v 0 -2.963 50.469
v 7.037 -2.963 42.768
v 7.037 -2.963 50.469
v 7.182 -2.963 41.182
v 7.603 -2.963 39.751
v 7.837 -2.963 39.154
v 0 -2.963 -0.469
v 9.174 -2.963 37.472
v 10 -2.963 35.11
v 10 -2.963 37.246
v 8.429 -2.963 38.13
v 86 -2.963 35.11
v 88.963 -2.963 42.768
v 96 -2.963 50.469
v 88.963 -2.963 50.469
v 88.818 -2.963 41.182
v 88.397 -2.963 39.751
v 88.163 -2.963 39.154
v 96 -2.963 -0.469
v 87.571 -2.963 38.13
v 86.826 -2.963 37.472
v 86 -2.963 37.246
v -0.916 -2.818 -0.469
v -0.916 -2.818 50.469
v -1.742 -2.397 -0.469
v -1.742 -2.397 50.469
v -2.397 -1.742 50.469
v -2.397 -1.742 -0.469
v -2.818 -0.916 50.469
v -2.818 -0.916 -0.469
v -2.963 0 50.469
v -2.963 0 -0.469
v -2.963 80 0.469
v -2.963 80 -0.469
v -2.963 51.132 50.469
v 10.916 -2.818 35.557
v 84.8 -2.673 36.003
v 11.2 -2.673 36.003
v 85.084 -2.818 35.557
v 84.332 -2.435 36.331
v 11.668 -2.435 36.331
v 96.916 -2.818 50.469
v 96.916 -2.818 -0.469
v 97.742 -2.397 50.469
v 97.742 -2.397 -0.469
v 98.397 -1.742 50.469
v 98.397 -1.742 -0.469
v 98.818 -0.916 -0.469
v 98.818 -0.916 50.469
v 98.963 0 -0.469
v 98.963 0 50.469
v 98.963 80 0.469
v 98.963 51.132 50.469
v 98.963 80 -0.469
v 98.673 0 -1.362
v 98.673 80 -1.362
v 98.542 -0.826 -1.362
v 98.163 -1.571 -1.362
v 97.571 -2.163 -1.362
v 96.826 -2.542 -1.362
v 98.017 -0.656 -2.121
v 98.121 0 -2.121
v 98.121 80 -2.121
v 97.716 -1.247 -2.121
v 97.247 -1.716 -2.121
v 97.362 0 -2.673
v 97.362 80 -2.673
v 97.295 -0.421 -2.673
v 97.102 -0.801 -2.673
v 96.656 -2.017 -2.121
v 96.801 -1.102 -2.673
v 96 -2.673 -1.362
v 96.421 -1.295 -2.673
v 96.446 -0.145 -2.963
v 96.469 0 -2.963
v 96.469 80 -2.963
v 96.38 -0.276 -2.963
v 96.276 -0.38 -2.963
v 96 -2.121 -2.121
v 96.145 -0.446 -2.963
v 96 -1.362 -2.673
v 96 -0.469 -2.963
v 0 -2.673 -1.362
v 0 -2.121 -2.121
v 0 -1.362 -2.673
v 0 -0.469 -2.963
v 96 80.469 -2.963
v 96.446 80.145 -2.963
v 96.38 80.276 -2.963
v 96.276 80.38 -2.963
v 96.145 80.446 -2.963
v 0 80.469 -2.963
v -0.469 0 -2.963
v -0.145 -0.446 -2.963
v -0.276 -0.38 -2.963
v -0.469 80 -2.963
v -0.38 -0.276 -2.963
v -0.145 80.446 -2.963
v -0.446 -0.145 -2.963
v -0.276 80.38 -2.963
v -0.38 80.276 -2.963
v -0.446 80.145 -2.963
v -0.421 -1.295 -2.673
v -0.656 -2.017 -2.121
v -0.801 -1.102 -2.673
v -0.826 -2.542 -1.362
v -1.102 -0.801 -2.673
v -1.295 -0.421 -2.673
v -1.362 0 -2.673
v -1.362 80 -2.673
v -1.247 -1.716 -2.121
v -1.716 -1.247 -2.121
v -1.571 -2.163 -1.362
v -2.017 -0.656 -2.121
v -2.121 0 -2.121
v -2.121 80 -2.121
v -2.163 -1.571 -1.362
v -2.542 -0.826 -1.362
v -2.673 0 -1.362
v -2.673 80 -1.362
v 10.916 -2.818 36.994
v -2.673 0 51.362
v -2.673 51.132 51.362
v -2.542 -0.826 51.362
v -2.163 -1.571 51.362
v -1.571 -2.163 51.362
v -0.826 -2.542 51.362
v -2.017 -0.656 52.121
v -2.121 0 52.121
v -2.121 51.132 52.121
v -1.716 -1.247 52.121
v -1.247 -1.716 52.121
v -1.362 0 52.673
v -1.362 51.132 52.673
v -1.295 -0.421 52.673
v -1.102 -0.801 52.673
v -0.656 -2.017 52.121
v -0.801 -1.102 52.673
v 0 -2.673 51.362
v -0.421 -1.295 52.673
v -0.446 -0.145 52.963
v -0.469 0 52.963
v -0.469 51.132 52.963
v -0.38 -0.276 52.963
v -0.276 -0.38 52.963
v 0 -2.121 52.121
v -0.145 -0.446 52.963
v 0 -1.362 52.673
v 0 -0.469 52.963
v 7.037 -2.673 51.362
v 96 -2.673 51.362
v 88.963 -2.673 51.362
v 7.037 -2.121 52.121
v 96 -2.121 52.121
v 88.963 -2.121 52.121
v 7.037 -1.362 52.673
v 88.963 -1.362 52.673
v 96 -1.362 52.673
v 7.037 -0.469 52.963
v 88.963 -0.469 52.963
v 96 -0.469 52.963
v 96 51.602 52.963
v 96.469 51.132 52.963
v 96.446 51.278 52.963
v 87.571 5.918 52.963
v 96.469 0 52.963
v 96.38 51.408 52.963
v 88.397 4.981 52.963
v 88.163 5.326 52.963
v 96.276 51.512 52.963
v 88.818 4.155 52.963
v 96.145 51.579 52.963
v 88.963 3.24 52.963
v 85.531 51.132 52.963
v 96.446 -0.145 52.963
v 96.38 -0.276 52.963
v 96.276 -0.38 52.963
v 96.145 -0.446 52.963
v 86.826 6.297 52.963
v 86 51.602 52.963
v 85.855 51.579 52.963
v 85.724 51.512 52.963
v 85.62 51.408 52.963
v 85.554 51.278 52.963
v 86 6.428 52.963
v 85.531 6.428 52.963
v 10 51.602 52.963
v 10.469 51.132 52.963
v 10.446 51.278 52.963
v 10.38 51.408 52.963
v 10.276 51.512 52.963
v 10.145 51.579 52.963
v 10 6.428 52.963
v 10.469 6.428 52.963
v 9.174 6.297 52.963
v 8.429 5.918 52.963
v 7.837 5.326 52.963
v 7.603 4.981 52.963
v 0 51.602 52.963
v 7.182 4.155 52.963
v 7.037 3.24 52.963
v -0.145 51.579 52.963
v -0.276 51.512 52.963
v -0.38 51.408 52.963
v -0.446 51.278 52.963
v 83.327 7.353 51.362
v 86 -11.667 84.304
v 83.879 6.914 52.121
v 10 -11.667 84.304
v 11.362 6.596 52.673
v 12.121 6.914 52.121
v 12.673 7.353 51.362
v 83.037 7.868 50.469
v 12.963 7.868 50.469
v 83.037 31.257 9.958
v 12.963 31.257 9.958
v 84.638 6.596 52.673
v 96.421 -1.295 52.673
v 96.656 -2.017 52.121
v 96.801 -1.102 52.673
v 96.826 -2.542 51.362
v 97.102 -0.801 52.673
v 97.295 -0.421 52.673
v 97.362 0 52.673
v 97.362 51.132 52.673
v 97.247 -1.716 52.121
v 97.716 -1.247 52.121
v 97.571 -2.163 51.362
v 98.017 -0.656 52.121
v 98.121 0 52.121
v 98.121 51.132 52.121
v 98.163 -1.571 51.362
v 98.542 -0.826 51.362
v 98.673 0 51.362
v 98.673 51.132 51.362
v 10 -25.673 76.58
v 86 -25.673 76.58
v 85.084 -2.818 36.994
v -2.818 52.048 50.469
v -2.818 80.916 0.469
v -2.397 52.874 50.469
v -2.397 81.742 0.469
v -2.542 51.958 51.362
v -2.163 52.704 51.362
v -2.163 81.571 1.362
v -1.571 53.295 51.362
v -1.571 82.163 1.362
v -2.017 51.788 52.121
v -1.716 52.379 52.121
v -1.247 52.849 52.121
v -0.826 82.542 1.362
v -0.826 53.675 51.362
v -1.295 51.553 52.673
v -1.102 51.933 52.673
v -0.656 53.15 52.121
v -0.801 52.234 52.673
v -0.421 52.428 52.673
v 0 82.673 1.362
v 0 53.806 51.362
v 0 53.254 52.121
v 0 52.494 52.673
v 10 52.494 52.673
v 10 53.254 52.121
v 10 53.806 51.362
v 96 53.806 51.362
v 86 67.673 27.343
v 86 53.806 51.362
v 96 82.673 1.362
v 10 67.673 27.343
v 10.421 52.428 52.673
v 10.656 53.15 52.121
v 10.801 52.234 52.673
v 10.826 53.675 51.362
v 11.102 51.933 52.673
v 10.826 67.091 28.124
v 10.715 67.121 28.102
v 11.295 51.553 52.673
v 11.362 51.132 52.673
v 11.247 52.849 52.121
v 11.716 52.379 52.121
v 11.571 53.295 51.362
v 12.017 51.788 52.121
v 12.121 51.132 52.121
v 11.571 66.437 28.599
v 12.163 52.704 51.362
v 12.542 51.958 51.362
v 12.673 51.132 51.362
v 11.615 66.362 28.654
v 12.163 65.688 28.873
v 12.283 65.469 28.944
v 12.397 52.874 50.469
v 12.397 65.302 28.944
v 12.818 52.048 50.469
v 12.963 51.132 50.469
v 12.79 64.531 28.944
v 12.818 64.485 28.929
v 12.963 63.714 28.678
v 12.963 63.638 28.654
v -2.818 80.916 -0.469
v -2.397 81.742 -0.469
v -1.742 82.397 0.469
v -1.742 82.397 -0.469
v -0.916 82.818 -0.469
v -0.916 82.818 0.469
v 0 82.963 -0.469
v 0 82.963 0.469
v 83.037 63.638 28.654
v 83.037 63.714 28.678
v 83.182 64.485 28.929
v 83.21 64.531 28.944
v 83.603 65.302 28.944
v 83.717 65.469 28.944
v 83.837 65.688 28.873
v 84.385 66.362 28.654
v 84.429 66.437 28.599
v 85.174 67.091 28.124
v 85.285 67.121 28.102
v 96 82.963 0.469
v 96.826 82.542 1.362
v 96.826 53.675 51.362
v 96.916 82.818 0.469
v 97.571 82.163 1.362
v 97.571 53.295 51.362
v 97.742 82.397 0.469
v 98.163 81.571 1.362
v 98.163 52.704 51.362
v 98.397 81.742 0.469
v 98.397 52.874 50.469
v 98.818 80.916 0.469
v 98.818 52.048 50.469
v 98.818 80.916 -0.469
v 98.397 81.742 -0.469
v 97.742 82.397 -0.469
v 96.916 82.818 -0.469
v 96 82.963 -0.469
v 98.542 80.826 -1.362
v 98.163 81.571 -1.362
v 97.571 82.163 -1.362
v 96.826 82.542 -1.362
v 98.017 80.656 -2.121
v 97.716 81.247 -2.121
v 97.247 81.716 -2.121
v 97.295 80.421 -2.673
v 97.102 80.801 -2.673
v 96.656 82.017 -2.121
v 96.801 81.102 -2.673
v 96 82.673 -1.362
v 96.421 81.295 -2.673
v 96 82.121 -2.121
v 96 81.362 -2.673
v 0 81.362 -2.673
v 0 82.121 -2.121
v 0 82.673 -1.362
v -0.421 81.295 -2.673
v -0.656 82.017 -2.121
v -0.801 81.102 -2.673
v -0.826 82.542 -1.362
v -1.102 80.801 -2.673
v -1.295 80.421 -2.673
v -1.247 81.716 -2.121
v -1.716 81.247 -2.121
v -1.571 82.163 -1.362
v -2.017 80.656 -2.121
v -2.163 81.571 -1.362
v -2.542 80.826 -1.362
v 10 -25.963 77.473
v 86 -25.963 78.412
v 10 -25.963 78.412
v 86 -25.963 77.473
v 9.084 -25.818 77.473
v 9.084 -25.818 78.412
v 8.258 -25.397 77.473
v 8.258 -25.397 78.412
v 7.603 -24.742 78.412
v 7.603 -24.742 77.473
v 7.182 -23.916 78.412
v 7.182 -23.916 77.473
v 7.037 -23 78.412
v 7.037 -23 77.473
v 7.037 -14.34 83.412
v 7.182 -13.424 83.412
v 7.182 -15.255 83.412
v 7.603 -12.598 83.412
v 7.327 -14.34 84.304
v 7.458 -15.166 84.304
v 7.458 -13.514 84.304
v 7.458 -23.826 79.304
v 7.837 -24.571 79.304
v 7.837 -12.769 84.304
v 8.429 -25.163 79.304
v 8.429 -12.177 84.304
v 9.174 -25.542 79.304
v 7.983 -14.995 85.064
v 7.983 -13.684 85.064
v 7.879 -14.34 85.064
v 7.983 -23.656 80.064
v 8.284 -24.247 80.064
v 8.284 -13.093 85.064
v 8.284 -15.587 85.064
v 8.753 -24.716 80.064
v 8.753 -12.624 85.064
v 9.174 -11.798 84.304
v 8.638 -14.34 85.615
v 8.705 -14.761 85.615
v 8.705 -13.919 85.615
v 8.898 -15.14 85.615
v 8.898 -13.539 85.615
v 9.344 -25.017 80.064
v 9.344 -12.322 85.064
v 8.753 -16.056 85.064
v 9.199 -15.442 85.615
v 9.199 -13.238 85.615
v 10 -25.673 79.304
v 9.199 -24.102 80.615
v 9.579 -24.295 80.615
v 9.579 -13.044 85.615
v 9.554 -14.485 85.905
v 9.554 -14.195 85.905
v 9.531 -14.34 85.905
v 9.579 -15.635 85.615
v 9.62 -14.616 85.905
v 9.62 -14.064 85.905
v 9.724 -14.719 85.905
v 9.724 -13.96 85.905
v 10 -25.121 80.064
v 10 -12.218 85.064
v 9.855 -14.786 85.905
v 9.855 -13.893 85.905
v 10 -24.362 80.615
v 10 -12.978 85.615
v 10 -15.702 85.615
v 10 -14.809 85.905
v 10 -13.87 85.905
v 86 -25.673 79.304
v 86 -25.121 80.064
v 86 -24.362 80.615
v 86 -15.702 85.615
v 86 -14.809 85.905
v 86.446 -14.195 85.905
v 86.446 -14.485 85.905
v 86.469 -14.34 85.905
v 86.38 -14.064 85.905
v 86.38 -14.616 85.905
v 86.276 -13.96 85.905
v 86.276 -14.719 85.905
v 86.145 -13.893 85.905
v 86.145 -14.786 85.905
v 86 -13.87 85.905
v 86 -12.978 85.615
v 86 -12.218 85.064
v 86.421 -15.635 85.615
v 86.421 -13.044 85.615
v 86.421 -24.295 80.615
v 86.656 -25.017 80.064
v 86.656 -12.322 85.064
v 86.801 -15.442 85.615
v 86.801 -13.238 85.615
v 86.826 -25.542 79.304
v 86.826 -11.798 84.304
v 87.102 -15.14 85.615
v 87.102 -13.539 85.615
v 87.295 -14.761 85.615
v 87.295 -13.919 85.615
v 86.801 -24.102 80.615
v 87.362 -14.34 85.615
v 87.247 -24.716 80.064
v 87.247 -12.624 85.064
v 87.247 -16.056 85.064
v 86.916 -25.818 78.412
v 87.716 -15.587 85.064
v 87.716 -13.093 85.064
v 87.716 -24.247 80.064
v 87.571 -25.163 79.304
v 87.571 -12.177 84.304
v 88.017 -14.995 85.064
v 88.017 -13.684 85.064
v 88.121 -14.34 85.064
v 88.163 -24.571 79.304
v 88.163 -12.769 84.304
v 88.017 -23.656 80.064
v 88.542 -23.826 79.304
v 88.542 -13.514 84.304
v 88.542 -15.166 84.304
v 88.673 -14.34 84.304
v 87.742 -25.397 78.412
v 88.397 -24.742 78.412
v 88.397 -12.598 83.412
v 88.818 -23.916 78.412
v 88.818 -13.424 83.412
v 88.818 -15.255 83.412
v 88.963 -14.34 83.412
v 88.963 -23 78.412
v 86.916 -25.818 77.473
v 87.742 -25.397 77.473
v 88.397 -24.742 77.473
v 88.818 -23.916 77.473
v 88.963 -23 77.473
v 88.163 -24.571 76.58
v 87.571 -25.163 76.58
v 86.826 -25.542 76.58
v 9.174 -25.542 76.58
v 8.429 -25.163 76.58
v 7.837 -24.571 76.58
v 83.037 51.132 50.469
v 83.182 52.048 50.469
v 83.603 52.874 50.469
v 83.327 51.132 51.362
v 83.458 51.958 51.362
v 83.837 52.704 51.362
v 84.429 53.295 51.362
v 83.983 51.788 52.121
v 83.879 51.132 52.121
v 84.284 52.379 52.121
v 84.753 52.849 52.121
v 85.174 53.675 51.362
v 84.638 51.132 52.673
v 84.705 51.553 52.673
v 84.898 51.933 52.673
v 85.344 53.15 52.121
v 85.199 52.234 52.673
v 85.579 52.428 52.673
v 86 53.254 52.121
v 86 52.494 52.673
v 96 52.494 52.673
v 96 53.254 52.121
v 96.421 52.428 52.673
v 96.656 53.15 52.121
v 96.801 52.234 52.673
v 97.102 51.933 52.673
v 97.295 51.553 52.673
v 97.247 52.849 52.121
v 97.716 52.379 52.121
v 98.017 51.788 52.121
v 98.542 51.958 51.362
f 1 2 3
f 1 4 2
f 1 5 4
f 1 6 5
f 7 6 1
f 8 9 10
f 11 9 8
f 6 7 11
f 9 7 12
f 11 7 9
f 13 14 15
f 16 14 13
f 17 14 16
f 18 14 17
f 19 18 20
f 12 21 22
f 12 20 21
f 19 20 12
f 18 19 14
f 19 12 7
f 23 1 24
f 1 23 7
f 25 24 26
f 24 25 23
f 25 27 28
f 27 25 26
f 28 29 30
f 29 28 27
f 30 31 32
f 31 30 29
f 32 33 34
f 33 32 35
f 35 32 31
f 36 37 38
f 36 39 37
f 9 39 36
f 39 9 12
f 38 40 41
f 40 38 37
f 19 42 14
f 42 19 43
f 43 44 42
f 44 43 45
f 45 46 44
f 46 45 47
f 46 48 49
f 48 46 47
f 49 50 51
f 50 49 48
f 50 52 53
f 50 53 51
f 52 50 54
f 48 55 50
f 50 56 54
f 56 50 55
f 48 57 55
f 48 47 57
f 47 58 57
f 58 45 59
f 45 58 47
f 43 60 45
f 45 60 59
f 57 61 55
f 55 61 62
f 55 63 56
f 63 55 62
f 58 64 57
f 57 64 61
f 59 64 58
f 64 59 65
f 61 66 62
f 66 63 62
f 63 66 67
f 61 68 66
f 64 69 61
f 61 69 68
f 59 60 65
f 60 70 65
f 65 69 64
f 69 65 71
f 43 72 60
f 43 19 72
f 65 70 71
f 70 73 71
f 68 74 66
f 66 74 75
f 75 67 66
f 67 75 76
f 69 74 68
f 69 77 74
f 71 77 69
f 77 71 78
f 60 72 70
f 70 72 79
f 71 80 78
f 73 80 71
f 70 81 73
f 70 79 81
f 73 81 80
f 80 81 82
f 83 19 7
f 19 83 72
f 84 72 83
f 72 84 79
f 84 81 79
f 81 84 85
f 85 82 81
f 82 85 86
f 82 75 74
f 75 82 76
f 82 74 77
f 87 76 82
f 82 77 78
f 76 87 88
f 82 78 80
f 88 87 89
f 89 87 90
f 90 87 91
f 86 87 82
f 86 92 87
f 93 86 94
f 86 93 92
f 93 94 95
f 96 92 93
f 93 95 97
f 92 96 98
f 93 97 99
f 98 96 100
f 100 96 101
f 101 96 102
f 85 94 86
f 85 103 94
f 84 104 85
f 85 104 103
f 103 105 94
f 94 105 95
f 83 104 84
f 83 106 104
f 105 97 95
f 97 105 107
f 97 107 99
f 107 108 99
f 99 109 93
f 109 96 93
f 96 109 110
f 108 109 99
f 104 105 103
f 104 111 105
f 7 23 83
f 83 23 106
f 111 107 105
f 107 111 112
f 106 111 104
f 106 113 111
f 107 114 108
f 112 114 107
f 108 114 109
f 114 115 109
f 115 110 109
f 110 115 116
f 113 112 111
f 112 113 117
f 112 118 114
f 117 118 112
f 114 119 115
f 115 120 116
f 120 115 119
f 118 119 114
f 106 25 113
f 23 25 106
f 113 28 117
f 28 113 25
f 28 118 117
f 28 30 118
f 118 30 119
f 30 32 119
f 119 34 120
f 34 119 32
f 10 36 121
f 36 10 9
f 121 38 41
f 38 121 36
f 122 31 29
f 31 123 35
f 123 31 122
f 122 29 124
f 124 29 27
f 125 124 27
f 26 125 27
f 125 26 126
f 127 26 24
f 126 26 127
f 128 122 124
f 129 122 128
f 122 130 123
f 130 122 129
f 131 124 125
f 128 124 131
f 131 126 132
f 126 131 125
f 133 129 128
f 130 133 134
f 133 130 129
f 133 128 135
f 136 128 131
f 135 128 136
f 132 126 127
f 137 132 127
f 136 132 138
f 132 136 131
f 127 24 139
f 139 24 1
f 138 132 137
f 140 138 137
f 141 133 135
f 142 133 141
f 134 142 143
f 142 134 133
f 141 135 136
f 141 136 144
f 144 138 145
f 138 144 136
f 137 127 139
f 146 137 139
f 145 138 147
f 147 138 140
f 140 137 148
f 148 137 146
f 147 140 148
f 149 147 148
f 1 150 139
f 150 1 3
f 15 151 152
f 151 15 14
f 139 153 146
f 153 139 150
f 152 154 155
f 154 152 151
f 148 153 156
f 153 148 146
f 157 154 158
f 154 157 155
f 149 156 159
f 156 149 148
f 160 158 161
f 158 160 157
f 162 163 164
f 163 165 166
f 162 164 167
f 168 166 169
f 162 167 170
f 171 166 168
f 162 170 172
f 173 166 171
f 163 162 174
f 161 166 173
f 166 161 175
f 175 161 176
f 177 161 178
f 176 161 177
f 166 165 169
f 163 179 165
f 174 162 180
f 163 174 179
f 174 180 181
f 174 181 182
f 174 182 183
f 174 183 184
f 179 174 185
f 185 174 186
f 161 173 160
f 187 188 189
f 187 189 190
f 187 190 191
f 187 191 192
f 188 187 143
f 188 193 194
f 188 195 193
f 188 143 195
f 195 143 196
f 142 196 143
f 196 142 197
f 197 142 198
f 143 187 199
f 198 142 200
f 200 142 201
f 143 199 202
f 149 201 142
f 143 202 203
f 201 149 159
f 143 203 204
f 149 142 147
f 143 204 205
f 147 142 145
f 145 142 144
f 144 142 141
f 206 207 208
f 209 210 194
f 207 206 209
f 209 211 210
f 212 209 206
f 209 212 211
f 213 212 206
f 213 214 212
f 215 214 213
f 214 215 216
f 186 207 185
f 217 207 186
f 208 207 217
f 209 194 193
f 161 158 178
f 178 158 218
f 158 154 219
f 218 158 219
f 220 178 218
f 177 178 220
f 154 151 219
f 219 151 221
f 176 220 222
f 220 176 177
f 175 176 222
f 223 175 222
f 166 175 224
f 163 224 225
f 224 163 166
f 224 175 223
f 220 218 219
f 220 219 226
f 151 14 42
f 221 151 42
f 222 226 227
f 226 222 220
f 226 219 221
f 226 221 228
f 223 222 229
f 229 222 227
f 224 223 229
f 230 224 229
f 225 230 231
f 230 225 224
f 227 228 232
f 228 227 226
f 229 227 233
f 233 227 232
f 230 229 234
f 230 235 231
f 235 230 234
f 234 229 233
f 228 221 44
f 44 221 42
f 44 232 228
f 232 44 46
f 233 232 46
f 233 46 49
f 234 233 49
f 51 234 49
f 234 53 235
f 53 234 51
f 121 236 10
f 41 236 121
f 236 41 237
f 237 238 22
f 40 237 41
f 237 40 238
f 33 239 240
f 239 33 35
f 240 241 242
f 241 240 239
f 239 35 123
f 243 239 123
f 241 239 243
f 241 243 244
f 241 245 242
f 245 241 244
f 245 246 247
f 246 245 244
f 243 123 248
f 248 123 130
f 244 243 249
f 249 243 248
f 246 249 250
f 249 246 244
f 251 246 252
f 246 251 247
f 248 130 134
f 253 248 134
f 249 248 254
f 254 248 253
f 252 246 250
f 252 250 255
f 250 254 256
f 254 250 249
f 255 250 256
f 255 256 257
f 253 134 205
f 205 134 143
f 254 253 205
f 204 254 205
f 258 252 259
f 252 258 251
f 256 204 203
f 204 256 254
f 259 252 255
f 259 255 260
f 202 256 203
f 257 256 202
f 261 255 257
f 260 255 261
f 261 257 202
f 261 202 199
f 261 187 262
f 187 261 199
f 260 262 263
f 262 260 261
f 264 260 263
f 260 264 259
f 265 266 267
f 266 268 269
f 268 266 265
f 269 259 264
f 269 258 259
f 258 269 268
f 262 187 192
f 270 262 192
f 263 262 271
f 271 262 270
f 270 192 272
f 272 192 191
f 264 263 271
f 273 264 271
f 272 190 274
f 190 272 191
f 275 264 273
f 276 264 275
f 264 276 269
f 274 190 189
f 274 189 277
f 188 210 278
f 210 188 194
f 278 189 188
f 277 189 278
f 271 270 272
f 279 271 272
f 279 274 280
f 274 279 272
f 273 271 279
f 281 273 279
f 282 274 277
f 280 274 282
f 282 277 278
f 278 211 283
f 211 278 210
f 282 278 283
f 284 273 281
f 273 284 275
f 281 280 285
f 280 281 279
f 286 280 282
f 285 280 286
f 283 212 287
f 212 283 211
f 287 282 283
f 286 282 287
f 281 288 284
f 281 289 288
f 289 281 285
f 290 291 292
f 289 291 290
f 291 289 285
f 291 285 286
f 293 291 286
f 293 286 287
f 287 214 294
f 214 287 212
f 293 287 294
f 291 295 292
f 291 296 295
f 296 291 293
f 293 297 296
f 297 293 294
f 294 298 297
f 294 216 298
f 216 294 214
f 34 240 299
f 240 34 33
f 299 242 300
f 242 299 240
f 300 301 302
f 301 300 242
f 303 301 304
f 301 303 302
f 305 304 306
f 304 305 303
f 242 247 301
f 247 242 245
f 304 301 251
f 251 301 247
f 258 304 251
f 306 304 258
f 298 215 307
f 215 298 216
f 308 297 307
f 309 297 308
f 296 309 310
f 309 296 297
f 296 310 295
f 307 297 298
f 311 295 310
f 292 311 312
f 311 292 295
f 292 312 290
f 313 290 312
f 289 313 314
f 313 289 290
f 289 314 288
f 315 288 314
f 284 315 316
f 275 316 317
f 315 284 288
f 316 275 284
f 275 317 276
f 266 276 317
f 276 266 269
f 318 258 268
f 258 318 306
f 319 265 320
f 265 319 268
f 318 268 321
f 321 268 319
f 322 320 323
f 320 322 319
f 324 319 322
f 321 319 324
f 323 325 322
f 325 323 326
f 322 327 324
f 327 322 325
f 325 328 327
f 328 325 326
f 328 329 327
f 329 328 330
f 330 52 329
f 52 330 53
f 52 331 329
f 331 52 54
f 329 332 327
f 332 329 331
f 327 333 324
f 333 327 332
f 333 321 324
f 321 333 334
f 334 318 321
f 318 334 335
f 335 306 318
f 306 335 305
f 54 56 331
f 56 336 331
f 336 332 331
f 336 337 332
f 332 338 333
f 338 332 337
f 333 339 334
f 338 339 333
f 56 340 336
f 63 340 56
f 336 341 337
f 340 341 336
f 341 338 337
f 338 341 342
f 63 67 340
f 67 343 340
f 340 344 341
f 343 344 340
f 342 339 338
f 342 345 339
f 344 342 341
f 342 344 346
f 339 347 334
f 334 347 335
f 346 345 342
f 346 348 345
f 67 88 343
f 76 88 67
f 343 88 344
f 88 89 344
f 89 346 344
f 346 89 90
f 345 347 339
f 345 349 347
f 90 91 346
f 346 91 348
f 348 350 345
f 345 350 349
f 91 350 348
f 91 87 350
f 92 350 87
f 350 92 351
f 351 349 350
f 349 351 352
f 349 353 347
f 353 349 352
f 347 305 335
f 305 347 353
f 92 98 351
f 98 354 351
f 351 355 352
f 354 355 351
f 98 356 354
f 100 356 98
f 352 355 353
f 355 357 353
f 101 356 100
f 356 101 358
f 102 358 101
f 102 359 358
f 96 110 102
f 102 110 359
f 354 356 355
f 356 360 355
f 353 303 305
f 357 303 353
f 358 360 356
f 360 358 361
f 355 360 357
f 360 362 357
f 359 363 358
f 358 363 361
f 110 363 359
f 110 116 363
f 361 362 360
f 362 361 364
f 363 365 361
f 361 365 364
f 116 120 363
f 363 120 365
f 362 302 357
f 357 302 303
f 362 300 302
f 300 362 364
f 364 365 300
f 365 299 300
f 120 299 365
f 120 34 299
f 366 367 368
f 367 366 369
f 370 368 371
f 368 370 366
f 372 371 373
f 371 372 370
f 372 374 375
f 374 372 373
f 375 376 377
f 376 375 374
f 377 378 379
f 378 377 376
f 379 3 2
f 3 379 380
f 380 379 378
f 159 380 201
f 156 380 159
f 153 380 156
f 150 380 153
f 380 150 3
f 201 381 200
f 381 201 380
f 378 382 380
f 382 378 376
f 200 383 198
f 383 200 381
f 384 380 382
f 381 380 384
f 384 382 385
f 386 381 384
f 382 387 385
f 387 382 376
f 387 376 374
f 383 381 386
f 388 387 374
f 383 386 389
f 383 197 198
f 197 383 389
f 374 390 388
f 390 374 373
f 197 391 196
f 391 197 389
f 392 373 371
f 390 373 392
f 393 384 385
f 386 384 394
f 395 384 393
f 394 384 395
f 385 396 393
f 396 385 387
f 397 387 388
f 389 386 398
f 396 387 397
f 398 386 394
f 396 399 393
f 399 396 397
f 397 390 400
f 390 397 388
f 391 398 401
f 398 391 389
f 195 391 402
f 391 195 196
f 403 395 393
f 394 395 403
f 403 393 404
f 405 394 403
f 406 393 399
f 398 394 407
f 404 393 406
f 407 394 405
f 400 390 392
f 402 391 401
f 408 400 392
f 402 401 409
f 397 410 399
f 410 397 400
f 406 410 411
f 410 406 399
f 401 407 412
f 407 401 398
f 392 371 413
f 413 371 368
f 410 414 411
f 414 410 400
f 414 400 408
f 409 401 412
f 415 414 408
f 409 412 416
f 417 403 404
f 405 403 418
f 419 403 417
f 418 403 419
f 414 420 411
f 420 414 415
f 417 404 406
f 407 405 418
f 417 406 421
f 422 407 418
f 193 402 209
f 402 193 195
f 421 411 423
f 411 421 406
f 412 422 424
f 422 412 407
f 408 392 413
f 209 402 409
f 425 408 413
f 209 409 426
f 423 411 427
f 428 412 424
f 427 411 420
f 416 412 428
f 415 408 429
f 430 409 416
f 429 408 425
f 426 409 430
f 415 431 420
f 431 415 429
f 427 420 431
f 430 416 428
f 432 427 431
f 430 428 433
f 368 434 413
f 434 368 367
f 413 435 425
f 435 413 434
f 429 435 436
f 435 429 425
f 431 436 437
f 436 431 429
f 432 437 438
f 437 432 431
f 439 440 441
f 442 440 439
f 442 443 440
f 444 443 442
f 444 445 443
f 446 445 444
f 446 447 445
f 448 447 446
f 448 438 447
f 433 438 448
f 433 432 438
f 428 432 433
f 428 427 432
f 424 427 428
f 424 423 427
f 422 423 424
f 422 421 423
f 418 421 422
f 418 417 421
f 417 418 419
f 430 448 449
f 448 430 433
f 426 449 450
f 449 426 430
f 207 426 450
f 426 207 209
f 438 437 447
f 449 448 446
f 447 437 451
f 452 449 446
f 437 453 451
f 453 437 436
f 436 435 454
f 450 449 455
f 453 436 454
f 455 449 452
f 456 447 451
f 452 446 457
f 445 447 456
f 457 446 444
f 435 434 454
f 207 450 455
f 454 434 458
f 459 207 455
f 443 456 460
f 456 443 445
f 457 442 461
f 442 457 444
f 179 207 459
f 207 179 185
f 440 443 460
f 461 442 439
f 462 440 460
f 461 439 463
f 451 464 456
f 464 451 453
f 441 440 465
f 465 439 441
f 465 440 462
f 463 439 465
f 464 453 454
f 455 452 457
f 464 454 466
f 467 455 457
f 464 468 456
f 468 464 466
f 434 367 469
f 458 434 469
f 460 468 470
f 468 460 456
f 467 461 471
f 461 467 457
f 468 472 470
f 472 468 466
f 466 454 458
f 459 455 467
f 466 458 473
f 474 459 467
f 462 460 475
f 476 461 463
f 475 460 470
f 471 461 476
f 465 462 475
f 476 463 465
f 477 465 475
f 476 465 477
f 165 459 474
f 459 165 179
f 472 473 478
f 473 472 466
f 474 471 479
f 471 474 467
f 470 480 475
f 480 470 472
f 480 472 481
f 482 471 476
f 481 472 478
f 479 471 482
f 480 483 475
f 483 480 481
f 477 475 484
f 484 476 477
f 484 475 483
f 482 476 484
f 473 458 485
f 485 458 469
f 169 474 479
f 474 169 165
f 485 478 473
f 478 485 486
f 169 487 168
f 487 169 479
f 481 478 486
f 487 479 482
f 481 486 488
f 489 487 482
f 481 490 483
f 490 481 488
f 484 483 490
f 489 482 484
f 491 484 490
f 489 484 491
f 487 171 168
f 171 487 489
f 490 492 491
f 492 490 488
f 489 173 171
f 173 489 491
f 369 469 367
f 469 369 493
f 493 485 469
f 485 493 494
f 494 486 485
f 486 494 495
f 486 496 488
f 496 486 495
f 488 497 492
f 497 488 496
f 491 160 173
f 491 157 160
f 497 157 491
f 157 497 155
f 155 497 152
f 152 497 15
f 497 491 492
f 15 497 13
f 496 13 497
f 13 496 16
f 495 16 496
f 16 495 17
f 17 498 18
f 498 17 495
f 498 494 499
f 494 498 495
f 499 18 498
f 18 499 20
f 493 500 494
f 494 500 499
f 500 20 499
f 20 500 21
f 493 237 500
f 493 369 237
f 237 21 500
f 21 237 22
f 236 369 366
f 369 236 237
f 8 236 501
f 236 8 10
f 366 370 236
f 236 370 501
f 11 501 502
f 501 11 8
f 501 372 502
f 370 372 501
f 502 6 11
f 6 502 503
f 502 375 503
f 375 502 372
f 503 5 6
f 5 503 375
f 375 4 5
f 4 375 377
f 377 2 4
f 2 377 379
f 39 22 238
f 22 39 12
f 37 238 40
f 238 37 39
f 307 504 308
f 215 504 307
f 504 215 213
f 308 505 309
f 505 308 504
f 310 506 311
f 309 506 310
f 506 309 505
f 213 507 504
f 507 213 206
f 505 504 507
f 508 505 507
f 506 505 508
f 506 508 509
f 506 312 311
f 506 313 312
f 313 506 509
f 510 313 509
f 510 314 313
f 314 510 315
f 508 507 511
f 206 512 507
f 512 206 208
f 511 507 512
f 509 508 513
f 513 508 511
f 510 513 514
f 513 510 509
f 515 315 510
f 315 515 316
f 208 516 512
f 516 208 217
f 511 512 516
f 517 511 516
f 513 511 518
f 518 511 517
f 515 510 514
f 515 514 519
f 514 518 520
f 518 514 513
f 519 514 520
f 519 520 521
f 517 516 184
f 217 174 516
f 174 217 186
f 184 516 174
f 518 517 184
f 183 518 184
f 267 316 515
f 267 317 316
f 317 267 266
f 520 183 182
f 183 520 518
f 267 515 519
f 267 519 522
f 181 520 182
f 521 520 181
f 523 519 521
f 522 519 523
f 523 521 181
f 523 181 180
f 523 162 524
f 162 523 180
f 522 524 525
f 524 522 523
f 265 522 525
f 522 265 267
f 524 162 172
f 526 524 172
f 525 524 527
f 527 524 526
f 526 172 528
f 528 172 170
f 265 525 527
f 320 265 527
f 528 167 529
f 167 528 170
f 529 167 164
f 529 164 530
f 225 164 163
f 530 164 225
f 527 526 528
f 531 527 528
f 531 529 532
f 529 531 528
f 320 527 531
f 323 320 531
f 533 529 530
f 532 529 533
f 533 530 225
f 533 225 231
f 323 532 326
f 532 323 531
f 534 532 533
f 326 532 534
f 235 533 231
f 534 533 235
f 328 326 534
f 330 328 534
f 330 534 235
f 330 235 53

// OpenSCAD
// https://i0.wp.com/sourcing.co.uk/wp-content/uploads/2019/03/Promotional-Bamboo-Desktop-Mobile-Phone-Stand-Holder.jpg

phone_width = 76;

arm_width = 10;

chair_height = 50;
chair_width = phone_width + 2 * arm_width;
chair_depth = 80;
rounding_diameter = 6;

back_rotation = 30;

module chair_back() {
   translate([arm_width, arm_width*2.2, 0])
      rotate([back_rotation, 0, 0])
         cube([chair_width - 2 * arm_width, 
	      arm_width, 
	      chair_height*1.8]);
}

module chair_body() {
   difference() {
      cube([chair_width, chair_depth, chair_height]);
      translate([arm_width, arm_width*2, 0])
         rotate([back_rotation, 0, 0])
            cube([chair_width - 2 * arm_width, 
                 chair_depth,
	         chair_height*2]);
      translate([0, chair_depth, 0])
         rotate([back_rotation, 0, 0])
	    cube([chair_width, chair_depth, chair_height*2]);

		 	
   }
}

minkowski() {
   $fn = 20;
   union() {
      chair_body();
      chair_back();
   }
   sphere(d=rounding_diameter);
}
